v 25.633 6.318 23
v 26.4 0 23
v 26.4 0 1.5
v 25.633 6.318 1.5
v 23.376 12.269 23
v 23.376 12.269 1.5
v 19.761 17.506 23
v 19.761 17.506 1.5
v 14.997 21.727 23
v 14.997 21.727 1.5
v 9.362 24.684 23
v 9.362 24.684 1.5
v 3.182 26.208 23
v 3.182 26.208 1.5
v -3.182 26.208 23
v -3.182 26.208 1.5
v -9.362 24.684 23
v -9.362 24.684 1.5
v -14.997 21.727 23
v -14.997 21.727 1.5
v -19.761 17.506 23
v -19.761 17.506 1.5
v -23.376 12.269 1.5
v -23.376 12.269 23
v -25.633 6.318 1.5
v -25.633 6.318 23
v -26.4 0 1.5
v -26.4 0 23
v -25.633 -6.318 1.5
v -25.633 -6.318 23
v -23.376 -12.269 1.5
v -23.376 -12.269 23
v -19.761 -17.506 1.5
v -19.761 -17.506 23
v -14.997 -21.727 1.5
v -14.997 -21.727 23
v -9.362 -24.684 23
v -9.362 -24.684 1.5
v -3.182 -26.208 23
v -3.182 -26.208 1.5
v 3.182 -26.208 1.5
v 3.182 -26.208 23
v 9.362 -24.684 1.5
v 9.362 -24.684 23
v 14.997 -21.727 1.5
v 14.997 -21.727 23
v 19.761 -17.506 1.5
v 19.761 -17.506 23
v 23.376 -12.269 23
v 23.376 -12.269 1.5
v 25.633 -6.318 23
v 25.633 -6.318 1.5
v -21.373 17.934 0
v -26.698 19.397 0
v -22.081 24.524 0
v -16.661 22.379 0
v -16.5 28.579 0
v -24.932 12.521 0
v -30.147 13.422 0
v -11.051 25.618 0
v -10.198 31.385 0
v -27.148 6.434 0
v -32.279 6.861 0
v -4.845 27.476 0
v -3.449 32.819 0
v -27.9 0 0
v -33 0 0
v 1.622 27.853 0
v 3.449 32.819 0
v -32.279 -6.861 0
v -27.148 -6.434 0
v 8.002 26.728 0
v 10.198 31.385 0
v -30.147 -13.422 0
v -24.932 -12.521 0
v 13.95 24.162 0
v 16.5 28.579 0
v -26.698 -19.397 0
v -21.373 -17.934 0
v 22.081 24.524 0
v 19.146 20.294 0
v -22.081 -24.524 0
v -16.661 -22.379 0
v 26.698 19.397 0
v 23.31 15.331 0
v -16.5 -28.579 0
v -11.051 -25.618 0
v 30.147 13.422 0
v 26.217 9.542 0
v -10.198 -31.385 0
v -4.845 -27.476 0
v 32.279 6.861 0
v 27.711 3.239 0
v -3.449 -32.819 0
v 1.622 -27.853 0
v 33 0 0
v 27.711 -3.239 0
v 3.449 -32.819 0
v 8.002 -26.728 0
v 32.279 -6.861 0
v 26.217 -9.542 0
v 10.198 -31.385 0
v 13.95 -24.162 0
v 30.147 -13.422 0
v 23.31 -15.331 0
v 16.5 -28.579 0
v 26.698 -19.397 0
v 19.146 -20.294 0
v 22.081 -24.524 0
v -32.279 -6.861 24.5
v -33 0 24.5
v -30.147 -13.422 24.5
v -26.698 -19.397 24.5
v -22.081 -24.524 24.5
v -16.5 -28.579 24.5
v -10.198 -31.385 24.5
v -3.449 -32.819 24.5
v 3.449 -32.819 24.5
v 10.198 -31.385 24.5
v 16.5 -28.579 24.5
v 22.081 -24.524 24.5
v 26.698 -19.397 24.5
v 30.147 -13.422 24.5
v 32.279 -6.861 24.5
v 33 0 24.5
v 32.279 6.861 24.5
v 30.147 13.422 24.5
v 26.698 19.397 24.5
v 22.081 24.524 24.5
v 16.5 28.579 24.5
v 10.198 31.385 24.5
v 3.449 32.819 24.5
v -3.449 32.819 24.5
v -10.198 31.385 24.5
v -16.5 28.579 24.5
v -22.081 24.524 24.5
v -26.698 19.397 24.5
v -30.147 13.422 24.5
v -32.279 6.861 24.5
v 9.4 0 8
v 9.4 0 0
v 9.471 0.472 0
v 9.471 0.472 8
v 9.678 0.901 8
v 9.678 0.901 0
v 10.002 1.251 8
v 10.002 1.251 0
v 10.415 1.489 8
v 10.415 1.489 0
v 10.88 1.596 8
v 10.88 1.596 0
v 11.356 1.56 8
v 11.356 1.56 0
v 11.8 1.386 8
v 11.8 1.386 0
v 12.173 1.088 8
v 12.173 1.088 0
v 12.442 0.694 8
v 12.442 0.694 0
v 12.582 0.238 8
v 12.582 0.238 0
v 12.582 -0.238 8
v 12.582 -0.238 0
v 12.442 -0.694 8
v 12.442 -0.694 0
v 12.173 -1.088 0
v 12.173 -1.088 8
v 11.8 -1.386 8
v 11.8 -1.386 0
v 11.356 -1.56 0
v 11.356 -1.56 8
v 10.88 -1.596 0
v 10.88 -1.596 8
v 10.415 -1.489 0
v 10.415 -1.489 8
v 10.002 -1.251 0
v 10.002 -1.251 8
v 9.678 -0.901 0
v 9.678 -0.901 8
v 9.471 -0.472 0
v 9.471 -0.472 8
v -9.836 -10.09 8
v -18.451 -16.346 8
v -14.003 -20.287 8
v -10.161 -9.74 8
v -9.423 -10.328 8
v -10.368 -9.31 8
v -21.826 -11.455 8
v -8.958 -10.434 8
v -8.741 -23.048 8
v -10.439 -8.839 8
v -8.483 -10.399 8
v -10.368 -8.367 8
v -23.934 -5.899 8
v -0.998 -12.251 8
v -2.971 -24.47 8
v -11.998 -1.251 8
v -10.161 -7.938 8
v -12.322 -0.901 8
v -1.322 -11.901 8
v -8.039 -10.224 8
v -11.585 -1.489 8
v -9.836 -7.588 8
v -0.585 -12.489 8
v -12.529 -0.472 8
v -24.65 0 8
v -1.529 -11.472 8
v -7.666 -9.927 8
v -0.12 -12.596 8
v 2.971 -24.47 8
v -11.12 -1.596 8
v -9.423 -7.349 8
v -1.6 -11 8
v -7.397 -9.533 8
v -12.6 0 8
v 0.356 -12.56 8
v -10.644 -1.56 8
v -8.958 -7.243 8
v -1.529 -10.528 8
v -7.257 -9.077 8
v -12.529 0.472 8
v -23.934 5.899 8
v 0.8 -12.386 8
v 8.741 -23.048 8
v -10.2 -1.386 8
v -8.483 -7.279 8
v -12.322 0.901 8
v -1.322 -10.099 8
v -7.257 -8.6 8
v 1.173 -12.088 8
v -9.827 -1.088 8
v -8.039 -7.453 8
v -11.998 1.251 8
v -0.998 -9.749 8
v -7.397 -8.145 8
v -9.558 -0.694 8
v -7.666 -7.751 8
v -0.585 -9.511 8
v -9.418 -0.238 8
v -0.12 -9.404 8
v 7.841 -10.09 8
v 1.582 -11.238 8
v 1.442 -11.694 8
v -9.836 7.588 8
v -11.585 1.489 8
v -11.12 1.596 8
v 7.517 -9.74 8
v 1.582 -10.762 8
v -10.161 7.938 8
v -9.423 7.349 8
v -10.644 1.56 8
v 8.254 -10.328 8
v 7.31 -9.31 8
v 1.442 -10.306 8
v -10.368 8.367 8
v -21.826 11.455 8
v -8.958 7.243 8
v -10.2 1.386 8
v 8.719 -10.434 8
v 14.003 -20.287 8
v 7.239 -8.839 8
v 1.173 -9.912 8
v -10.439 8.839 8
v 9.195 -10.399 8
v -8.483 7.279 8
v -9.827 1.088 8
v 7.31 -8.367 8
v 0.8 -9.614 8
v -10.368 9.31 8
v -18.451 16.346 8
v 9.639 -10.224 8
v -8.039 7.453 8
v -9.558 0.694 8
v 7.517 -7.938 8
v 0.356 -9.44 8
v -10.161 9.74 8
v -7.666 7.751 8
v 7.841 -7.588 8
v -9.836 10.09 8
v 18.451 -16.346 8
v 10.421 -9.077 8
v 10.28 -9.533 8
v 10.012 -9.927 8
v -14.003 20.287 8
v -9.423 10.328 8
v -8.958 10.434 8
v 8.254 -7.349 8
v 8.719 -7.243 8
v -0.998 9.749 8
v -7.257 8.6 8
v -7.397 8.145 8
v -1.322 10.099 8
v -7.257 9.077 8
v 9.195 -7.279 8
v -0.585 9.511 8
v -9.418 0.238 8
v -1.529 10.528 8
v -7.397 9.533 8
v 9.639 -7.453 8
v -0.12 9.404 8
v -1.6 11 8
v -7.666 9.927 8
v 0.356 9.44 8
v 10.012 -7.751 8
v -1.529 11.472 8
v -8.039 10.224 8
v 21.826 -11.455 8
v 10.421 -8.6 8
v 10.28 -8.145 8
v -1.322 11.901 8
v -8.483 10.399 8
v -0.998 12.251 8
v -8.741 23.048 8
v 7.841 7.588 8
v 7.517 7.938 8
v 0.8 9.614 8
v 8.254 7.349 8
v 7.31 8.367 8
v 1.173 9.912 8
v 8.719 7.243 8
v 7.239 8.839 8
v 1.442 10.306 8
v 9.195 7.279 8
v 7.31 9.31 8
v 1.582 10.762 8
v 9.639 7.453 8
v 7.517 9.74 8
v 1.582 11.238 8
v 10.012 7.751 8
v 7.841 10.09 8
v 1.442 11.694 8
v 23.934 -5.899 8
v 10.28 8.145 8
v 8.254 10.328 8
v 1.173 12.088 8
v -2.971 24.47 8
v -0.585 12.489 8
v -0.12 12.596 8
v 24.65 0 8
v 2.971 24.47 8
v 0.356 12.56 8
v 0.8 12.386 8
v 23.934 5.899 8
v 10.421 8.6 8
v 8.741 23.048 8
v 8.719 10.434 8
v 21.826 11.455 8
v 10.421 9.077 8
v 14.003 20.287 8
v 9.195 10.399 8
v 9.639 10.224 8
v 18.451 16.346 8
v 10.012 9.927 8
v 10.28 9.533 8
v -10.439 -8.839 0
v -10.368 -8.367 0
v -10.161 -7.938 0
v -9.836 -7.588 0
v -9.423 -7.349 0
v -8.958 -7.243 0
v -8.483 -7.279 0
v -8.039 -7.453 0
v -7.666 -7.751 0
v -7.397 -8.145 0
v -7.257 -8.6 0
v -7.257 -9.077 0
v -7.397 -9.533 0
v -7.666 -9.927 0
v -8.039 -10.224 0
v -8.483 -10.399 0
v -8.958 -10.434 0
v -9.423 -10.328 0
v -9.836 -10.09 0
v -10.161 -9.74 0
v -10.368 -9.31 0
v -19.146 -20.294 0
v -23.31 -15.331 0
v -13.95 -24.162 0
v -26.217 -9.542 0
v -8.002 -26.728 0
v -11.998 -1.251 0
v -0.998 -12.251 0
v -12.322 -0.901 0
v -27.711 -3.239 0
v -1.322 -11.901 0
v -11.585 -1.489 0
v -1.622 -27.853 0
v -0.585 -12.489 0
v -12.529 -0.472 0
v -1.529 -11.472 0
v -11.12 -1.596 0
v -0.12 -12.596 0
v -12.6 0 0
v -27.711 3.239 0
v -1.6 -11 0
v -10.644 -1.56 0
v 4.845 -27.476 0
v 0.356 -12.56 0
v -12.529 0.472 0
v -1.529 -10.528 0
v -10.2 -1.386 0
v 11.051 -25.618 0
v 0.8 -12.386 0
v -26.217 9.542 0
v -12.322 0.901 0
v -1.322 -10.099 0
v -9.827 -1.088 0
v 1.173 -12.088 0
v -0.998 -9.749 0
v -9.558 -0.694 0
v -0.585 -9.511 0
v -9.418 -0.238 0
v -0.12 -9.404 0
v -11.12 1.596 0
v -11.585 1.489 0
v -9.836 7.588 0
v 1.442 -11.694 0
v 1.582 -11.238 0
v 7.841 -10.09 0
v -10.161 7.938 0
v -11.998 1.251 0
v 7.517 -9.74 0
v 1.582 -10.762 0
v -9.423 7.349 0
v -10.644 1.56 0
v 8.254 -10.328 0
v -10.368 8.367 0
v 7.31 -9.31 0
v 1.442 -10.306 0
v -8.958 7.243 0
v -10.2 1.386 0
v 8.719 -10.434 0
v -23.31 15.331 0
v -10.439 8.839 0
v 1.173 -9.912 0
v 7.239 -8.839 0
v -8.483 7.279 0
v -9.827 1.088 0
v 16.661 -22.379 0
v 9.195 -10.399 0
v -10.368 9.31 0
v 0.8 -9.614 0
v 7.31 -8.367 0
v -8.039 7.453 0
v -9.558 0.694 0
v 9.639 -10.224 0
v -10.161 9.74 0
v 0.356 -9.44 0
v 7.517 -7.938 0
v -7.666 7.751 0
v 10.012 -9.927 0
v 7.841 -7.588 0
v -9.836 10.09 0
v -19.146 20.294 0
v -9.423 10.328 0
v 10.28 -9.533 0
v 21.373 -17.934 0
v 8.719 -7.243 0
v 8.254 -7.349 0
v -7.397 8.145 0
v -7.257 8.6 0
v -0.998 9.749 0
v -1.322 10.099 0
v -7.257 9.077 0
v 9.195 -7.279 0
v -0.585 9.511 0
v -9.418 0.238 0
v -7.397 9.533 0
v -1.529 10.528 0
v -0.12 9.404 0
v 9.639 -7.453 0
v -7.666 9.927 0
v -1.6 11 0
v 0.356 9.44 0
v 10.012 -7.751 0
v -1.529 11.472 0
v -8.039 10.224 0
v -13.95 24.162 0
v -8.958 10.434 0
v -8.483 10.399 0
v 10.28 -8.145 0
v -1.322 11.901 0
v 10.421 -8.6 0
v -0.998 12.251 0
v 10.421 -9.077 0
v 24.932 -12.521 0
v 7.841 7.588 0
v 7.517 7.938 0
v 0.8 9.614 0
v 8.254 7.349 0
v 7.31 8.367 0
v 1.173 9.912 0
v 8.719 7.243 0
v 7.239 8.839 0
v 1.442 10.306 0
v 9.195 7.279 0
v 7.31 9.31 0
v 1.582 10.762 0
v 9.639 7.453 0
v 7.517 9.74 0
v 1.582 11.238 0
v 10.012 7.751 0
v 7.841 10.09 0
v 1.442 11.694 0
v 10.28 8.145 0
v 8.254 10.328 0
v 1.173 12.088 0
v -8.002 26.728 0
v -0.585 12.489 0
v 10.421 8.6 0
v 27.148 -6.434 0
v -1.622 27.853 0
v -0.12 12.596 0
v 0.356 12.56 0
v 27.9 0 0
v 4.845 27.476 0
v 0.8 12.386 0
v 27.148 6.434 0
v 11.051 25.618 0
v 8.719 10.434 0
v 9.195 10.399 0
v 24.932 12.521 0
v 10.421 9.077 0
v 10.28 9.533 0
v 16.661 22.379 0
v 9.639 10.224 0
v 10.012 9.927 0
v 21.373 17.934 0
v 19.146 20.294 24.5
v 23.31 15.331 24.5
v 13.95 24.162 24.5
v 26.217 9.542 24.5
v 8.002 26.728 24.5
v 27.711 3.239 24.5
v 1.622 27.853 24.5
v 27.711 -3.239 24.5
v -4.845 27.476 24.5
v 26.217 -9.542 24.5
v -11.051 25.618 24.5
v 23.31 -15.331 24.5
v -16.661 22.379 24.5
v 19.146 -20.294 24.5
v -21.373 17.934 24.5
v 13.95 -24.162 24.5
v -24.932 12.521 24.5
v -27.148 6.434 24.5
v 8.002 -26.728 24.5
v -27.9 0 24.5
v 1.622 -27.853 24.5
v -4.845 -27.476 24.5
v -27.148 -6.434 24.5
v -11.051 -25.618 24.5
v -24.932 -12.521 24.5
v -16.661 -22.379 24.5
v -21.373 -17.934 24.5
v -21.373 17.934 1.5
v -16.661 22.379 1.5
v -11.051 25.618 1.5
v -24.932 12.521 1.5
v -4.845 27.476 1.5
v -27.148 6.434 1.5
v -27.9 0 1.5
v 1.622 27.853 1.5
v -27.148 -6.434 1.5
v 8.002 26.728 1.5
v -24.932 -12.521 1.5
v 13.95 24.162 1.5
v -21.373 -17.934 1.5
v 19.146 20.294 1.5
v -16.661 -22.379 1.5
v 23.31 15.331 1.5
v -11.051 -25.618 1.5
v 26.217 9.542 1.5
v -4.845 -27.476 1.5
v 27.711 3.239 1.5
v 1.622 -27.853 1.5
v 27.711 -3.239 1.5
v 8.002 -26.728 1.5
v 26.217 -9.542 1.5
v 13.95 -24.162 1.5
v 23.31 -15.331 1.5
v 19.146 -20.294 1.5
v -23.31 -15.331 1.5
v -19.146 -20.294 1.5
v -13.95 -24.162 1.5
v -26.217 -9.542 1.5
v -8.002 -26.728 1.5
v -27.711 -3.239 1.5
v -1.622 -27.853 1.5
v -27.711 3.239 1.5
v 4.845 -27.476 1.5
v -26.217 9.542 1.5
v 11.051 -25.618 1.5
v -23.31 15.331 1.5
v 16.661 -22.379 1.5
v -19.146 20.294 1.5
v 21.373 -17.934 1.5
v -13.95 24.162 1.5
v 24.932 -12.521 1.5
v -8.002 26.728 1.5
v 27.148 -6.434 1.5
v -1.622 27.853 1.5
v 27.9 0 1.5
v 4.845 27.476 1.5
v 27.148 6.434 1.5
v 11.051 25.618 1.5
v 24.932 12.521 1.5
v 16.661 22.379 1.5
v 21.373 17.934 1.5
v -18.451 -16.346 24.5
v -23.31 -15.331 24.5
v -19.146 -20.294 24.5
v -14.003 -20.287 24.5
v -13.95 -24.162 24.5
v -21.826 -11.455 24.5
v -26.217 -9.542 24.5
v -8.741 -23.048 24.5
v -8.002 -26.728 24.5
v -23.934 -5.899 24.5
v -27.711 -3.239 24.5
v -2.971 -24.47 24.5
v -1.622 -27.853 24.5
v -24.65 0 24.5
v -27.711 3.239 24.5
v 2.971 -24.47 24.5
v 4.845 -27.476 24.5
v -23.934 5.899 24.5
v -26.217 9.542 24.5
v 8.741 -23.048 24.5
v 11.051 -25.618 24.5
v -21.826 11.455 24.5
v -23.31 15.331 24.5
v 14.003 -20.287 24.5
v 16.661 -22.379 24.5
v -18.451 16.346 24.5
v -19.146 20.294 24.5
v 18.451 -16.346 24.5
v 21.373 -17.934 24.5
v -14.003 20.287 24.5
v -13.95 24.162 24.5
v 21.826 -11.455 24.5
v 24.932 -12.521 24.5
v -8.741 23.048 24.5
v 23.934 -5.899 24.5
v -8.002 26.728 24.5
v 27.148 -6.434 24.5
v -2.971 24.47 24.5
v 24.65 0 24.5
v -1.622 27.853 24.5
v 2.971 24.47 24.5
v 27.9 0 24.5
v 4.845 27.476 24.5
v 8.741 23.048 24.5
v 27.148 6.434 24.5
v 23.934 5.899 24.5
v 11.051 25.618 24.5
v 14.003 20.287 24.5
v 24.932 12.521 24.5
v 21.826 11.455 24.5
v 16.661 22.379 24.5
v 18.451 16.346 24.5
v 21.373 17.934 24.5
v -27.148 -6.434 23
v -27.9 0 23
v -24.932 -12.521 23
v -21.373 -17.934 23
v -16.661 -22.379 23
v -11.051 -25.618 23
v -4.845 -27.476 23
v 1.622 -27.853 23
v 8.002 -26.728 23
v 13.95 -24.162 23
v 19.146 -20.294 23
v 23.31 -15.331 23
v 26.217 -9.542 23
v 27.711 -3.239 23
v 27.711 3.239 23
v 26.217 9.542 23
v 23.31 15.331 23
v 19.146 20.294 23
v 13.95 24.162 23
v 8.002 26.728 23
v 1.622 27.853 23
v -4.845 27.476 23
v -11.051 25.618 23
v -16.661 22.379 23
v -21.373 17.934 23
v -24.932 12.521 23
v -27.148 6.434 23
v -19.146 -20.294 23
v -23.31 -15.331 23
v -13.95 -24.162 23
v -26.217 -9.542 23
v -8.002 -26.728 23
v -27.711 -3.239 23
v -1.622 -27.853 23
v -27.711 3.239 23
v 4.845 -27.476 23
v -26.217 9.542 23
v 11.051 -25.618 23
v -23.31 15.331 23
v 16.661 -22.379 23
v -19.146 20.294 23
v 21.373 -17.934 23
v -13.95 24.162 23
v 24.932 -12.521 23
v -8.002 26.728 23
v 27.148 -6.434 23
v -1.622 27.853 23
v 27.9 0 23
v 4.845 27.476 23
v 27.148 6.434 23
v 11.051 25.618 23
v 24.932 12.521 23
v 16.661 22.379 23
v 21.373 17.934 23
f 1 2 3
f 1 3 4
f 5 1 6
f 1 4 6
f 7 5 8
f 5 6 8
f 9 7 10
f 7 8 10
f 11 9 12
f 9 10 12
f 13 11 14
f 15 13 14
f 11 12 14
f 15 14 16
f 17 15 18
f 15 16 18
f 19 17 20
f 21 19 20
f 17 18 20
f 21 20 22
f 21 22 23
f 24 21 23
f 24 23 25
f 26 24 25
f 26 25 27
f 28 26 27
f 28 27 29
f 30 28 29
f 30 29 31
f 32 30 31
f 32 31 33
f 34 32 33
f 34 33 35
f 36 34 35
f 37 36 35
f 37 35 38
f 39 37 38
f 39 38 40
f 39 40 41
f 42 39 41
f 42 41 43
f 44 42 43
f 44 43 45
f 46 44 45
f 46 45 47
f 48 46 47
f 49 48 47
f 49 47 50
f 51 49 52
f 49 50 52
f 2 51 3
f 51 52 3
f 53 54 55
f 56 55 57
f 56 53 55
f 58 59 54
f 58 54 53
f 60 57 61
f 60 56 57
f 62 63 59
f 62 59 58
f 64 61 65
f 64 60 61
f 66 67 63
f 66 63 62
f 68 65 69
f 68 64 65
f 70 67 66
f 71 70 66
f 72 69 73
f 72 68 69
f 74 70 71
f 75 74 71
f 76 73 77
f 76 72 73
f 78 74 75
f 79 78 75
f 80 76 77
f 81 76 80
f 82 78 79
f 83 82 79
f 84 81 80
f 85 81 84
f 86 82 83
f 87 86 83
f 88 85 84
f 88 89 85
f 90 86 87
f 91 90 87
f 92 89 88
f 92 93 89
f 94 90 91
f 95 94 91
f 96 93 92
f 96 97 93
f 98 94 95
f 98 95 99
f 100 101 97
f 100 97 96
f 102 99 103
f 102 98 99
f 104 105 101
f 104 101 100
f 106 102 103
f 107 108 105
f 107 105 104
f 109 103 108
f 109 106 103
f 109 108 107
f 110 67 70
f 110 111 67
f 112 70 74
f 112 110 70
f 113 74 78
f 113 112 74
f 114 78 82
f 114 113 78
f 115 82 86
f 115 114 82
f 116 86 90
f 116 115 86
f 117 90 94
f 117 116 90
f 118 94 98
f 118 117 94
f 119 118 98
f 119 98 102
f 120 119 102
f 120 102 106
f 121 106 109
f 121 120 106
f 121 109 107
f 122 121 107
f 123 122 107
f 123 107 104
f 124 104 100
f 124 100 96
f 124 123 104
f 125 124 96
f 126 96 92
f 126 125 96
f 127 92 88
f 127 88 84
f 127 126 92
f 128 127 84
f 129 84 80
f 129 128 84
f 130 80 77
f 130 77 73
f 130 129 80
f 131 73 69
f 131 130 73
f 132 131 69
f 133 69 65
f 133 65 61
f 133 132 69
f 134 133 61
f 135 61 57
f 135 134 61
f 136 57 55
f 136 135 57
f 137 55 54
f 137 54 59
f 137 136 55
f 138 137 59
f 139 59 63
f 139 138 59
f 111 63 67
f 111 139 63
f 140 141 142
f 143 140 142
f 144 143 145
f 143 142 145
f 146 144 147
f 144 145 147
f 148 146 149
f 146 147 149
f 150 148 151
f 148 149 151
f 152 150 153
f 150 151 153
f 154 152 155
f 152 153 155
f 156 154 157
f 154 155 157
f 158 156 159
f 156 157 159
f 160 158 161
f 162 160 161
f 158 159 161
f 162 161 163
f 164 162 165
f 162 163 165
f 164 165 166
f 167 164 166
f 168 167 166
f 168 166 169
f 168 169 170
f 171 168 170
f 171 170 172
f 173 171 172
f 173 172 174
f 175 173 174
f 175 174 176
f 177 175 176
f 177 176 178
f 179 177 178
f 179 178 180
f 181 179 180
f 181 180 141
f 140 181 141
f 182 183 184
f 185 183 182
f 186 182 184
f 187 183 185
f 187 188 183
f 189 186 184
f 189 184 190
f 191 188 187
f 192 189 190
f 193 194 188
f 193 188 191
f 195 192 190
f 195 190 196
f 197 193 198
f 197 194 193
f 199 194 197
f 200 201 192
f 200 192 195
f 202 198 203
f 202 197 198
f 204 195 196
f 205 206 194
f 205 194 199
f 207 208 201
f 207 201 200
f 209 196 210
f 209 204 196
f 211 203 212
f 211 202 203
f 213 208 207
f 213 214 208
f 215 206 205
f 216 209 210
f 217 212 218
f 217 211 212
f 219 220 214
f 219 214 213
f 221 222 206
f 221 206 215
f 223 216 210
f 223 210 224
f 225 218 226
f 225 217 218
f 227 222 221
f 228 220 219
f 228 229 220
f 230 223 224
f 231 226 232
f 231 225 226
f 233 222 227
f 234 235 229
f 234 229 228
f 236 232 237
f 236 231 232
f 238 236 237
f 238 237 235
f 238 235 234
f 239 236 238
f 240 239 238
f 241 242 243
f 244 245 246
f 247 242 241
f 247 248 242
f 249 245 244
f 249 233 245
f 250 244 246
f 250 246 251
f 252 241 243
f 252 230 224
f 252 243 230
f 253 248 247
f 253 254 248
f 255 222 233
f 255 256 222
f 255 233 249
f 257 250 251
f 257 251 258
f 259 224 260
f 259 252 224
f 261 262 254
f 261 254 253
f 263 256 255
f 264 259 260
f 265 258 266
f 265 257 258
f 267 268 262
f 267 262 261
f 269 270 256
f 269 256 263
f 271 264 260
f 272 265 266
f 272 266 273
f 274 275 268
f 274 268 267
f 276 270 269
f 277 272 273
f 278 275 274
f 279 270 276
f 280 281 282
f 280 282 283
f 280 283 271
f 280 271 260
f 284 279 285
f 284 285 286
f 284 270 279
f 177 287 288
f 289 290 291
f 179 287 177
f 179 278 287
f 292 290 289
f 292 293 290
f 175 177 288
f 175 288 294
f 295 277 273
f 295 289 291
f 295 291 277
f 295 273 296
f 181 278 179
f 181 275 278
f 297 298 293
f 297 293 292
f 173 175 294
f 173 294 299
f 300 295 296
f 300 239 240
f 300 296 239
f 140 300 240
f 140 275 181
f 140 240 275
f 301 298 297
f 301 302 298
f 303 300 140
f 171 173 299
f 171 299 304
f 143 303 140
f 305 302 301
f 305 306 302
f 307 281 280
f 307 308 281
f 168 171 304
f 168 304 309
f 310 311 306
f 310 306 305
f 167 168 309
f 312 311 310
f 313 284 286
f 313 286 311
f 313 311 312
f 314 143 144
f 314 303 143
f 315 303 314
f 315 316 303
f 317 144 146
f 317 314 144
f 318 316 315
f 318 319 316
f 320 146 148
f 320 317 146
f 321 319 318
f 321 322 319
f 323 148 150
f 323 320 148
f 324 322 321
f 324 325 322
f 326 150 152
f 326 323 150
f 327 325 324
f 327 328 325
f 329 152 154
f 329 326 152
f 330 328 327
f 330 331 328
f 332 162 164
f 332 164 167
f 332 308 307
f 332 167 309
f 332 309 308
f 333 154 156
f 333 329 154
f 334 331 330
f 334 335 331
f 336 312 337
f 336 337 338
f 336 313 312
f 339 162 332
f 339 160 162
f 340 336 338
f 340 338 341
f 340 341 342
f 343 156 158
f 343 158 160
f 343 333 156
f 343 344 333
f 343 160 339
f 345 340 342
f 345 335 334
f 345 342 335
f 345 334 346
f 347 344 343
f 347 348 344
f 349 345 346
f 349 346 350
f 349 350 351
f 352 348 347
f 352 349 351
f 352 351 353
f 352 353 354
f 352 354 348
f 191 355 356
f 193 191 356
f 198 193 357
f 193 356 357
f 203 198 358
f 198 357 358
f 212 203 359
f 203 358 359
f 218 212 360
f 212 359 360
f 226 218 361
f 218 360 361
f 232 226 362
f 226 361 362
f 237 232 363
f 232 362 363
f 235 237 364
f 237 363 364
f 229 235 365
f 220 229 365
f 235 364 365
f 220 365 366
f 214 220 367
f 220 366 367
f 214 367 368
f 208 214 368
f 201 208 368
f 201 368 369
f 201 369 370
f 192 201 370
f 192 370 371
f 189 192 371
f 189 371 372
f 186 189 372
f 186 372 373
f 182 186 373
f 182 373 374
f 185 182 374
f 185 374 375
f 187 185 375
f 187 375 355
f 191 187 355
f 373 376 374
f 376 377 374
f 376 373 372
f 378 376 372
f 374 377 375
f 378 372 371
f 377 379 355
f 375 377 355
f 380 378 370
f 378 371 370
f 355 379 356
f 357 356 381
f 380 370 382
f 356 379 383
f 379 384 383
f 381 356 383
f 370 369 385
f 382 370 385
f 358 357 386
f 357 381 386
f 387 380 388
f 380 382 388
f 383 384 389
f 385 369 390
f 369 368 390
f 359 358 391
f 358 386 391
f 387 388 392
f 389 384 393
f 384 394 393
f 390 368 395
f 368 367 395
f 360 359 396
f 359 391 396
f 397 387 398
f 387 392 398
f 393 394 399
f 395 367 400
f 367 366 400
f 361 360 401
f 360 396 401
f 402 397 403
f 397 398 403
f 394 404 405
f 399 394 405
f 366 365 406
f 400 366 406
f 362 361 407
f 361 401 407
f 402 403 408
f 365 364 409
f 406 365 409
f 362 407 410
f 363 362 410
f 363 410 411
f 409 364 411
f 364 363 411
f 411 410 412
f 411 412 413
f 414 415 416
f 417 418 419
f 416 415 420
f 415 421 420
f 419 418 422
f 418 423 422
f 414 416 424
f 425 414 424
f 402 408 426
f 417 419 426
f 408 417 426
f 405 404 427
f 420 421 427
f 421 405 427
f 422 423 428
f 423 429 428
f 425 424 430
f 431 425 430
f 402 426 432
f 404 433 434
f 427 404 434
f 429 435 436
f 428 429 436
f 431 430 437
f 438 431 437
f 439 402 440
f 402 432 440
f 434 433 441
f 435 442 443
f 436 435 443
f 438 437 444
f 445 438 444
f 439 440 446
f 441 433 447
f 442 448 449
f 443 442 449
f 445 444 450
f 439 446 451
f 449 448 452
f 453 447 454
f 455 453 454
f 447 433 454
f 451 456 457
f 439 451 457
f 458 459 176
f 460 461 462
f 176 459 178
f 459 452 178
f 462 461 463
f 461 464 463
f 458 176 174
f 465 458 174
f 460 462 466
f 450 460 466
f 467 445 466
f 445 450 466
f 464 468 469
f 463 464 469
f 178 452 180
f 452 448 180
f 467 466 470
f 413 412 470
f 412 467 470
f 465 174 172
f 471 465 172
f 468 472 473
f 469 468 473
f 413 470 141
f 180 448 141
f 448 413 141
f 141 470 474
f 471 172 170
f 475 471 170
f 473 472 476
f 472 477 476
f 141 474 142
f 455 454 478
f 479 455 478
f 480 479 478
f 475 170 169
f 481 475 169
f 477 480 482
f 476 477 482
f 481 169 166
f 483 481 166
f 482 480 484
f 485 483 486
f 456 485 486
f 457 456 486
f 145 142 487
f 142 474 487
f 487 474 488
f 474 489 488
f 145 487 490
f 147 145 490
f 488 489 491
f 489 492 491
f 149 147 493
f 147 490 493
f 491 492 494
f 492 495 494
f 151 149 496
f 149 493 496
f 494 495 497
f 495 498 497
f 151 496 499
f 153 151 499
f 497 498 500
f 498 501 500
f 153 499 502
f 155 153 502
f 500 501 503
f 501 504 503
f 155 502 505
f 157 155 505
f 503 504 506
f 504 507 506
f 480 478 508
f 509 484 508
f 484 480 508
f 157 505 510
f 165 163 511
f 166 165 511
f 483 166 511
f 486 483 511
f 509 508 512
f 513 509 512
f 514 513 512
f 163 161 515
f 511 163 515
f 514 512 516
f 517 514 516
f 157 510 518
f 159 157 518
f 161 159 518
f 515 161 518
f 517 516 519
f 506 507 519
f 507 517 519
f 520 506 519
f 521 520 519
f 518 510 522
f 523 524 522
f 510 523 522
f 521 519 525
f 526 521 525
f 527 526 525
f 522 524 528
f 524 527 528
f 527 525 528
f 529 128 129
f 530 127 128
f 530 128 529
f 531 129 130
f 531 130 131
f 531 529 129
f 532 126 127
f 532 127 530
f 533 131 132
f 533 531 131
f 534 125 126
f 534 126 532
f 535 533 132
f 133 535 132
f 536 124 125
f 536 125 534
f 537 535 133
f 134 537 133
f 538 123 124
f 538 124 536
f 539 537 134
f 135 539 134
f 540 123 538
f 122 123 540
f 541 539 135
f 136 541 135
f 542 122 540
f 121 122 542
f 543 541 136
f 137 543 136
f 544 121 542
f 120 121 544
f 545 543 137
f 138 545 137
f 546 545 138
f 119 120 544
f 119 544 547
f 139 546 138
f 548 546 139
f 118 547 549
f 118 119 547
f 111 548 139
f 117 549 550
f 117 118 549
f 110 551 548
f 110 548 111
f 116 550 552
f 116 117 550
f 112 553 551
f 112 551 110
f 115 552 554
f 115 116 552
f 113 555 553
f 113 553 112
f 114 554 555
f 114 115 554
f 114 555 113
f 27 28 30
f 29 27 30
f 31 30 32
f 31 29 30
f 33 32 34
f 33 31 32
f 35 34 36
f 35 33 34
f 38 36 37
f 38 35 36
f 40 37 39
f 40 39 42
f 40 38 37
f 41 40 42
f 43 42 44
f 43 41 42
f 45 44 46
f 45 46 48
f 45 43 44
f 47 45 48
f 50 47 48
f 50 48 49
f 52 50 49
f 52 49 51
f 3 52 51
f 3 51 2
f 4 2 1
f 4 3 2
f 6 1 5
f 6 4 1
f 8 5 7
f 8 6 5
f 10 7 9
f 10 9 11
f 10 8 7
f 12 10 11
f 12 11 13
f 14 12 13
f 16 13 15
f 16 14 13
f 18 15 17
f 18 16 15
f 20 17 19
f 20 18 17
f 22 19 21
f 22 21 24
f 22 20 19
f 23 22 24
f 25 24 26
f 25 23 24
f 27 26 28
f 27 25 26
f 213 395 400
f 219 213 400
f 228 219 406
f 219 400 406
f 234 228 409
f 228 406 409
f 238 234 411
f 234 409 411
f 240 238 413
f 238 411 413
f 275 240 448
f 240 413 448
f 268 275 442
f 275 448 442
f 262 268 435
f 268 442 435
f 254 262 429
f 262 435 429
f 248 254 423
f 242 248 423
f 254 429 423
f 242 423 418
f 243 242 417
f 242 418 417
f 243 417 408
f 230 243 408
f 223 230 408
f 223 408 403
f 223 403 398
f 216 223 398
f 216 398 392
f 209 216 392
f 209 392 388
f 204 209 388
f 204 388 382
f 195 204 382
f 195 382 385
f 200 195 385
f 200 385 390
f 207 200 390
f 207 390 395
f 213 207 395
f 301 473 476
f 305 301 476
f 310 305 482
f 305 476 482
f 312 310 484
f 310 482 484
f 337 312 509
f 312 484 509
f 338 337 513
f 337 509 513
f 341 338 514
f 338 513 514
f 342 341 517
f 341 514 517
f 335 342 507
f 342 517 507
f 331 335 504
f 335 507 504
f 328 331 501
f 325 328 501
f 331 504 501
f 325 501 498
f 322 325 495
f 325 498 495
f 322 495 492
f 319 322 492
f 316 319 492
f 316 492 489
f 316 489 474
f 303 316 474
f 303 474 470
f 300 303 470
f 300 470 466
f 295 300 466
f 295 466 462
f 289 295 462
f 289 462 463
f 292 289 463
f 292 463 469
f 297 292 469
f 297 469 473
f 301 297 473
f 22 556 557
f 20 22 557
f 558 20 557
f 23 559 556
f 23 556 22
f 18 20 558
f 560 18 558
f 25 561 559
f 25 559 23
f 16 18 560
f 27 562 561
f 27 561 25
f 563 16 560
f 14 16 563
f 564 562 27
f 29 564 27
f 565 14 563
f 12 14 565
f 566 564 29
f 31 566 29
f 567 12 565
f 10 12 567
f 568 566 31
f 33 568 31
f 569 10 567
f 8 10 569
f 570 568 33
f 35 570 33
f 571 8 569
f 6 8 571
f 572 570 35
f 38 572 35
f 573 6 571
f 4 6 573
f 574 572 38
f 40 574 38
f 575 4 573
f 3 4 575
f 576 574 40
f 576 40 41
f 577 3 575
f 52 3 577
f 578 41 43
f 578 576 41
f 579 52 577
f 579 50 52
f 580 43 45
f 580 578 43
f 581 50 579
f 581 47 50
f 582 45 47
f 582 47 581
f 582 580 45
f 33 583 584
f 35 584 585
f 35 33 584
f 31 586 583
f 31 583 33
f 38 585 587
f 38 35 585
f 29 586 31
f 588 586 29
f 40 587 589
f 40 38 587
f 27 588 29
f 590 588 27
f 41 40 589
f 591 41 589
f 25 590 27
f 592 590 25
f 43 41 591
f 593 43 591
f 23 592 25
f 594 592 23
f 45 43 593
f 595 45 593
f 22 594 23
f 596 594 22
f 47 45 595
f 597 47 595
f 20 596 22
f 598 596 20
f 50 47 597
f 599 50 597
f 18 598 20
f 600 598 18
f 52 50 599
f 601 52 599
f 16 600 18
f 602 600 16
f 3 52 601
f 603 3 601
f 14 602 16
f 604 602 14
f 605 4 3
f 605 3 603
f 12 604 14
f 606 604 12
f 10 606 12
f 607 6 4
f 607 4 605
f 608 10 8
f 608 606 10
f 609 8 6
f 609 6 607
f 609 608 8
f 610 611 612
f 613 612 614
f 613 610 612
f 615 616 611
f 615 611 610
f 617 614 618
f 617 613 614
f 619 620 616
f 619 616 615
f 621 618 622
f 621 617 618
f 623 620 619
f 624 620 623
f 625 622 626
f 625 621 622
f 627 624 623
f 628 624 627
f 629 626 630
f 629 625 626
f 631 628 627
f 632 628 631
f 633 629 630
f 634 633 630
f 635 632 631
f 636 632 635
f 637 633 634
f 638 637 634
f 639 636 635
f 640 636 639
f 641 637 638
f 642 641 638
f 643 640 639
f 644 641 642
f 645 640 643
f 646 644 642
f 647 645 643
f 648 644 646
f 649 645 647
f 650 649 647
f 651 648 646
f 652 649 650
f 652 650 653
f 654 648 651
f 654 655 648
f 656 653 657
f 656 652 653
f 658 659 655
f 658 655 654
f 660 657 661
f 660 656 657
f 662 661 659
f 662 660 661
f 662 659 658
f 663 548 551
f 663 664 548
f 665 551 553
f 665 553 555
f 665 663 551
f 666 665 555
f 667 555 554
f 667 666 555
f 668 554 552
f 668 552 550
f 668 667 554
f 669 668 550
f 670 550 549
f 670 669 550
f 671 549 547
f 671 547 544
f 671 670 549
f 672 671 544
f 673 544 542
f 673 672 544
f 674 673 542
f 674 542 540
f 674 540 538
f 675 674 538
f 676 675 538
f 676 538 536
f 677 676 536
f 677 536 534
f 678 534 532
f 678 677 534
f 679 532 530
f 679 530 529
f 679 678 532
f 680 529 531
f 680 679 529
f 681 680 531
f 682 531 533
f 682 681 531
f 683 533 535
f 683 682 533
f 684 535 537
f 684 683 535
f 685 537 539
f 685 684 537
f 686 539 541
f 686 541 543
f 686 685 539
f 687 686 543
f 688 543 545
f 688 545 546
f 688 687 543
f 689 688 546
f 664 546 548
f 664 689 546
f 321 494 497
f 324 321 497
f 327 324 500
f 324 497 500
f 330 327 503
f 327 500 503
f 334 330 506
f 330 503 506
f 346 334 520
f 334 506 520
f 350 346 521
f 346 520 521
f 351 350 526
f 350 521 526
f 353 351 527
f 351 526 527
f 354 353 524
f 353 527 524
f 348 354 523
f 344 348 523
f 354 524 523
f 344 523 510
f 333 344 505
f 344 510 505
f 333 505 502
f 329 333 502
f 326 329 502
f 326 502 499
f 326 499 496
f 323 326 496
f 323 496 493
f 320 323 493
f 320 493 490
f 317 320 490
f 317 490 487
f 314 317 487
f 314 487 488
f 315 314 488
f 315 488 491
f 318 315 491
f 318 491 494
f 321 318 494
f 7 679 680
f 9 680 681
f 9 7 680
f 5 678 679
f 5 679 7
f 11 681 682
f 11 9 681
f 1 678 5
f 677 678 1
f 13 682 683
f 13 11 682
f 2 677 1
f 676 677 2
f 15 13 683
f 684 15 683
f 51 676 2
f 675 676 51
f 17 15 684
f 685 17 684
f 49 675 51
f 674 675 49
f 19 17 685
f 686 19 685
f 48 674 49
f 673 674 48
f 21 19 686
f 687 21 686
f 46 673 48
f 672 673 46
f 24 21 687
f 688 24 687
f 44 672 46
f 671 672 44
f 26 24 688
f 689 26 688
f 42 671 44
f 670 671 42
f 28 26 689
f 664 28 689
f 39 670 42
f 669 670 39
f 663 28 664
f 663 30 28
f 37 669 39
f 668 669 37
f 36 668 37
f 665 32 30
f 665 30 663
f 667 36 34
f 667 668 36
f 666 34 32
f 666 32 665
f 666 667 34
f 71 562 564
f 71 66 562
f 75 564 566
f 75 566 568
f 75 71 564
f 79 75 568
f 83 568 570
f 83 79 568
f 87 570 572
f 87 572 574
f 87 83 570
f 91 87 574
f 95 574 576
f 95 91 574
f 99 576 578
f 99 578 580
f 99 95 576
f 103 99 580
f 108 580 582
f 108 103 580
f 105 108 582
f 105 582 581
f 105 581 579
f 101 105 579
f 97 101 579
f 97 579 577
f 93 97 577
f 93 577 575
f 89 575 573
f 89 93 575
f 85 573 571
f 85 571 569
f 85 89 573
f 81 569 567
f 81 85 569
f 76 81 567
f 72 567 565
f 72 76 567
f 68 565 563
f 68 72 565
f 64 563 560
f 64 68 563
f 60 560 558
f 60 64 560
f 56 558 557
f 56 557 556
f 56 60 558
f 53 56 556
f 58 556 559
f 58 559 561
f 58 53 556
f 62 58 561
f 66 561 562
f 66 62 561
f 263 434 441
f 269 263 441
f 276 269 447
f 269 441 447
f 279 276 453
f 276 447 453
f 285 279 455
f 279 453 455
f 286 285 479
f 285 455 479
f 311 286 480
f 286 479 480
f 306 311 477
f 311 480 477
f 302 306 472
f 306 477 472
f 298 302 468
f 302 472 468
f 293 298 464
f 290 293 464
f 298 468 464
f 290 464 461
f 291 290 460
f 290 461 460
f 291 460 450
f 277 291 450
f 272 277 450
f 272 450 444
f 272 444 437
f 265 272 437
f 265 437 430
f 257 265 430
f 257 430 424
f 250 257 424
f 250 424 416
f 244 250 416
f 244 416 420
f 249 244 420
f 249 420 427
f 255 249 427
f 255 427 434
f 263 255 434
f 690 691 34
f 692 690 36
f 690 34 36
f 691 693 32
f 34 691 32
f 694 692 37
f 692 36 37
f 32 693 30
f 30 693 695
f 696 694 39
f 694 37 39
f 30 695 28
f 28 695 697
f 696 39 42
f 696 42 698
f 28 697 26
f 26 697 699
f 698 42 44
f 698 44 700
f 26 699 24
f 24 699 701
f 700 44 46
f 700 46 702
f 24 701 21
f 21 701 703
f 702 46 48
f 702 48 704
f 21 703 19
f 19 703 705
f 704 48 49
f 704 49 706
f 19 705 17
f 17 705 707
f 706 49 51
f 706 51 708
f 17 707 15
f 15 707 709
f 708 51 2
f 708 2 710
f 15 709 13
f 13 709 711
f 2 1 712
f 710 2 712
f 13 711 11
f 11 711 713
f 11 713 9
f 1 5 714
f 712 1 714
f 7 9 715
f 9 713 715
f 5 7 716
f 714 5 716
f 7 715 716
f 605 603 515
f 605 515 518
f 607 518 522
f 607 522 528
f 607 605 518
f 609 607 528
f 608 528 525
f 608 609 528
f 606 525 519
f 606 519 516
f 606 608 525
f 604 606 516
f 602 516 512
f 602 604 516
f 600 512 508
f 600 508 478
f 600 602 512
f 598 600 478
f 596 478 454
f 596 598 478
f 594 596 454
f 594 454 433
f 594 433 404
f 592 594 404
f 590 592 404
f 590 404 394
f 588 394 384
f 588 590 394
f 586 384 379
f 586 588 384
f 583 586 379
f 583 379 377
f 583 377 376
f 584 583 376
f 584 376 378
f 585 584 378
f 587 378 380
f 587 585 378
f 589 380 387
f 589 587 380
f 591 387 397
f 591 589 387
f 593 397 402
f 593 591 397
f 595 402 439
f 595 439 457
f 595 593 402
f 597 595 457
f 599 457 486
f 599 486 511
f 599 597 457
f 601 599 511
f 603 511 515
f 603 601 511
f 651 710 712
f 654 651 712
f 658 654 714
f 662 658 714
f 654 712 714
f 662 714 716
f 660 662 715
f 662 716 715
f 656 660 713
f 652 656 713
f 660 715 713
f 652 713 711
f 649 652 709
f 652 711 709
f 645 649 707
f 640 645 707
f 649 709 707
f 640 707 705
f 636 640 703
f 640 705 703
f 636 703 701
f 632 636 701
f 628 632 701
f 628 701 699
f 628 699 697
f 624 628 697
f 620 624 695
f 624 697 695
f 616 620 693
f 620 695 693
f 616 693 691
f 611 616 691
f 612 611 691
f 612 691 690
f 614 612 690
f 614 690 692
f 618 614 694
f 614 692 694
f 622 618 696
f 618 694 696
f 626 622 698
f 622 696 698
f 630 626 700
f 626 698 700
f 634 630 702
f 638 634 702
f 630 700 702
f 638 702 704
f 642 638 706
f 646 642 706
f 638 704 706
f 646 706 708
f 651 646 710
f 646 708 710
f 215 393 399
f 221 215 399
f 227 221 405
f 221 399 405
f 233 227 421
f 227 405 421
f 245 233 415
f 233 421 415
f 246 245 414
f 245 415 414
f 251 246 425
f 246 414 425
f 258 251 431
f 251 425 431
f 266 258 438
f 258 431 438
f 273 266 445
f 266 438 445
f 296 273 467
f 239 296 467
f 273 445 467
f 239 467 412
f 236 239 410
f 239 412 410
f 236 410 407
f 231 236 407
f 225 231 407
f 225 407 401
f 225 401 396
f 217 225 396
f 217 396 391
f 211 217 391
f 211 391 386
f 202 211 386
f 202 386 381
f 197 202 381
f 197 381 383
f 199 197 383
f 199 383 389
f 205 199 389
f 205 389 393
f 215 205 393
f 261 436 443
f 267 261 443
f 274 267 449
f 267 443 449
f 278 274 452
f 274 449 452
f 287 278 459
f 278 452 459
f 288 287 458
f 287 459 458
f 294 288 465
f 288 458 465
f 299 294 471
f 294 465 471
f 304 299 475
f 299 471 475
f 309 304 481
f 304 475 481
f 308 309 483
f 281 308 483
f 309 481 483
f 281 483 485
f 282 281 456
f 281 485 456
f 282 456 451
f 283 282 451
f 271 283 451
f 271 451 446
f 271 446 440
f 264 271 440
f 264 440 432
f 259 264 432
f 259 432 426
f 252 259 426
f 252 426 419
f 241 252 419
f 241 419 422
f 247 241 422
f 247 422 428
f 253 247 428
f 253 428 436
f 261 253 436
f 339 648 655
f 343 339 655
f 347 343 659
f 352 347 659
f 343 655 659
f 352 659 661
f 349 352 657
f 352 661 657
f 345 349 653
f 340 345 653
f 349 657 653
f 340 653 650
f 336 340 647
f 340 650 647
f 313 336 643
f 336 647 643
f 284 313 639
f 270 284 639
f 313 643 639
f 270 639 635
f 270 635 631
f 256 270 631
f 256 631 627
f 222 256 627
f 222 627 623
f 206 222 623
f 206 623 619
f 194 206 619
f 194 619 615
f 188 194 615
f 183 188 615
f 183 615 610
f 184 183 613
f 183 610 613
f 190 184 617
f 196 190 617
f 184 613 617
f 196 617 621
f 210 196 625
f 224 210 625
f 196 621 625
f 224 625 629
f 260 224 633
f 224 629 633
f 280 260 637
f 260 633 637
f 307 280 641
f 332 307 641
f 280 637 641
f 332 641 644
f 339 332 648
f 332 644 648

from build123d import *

# Parameters (mm, degrees)
SKETCH_1_R          = 26.4
EXTRUDE_1_DEPTH     = 24.5
SKETCH_2_R          = 24.65
CUT_EXTRUDE_1_DEPTH = 16.5
EXTRUDE_START       = -1.5
SKETCH_5_R          = 27.9
SKETCH_5_R_2        = 26.4
EXTRUDE_3_DEPTH     = 1.5
SKETCH_4_R          = 1.6
CUT_EXTRUDE_2_DEPTH = 47.444267676


with BuildPart() as part:
    # 草图1 → 凸台-拉伸1 (new body)
    with BuildSketch(Plane.XY):
        Circle(SKETCH_1_R)
    extrude(amount=EXTRUDE_1_DEPTH)

    # 草图2 → 切除-拉伸1 (cut)
    with BuildSketch(Plane.XY.offset(24.5)):
        Circle(SKETCH_2_R)
    extrude(amount=-CUT_EXTRUDE_1_DEPTH, mode=Mode.SUBTRACT)

    # 草图5 → 凸台-拉伸3 (add)
    with BuildSketch(Plane.XY.offset(24.5).offset(EXTRUDE_START)):
        Circle(SKETCH_5_R)
        Circle(SKETCH_5_R_2, mode=Mode.SUBTRACT)
    extrude_3 = extrude(amount=EXTRUDE_3_DEPTH)

    # 镜向1: 凸台-拉伸3 across plane
    add(extrude_3.mirror(Plane(origin=(0, 0, 12.25), x_dir=(1, 0, 0), z_dir=(0, 0, -1))))

    # 草图4 → 切除-拉伸2 (cut, through all)
    with BuildSketch(Plane(origin=(0, 0, 0), x_dir=(-1, 0, 0), z_dir=(0, 0, -1))):
        with Locations((0, 11)):
            Circle(SKETCH_4_R)
        with Locations((11, 0)):
            Circle(SKETCH_4_R)
        with Locations((0, -11)):
            Circle(SKETCH_4_R)
        with Locations((-11, 0)):
            Circle(SKETCH_4_R)
        with Locations((8.838834765, 8.838834765)):
            Circle(SKETCH_4_R)
        with Locations((-8.838834765, 8.838834765)):
            Circle(SKETCH_4_R)
        with Locations((-8.838834765, -8.838834765)):
            Circle(SKETCH_4_R)
        with Locations((8.838834765, -8.838834765)):
            Circle(SKETCH_4_R)
    extrude(amount=-CUT_EXTRUDE_2_DEPTH, mode=Mode.SUBTRACT)


with BuildPart() as body_2:
    # 草图6 → 旋转1 (revolve)
    with BuildSketch(Plane(origin=(0, 0, 0), x_dir=(1, 0, 0), z_dir=(0, 1, 0))):
        Polygon((-33, 0), (-33, -24.5), (-27.9, -24.5), (-27.9, -23), (-26.4, -23), (-26.4, -1.5), (-27.9, -1.5), (-27.9, 0), align=None)
    revolve(axis=Axis((0, 0, -0.338387196), (0, 0, 1)))


solid = Compound([part.part, body_2.part])
